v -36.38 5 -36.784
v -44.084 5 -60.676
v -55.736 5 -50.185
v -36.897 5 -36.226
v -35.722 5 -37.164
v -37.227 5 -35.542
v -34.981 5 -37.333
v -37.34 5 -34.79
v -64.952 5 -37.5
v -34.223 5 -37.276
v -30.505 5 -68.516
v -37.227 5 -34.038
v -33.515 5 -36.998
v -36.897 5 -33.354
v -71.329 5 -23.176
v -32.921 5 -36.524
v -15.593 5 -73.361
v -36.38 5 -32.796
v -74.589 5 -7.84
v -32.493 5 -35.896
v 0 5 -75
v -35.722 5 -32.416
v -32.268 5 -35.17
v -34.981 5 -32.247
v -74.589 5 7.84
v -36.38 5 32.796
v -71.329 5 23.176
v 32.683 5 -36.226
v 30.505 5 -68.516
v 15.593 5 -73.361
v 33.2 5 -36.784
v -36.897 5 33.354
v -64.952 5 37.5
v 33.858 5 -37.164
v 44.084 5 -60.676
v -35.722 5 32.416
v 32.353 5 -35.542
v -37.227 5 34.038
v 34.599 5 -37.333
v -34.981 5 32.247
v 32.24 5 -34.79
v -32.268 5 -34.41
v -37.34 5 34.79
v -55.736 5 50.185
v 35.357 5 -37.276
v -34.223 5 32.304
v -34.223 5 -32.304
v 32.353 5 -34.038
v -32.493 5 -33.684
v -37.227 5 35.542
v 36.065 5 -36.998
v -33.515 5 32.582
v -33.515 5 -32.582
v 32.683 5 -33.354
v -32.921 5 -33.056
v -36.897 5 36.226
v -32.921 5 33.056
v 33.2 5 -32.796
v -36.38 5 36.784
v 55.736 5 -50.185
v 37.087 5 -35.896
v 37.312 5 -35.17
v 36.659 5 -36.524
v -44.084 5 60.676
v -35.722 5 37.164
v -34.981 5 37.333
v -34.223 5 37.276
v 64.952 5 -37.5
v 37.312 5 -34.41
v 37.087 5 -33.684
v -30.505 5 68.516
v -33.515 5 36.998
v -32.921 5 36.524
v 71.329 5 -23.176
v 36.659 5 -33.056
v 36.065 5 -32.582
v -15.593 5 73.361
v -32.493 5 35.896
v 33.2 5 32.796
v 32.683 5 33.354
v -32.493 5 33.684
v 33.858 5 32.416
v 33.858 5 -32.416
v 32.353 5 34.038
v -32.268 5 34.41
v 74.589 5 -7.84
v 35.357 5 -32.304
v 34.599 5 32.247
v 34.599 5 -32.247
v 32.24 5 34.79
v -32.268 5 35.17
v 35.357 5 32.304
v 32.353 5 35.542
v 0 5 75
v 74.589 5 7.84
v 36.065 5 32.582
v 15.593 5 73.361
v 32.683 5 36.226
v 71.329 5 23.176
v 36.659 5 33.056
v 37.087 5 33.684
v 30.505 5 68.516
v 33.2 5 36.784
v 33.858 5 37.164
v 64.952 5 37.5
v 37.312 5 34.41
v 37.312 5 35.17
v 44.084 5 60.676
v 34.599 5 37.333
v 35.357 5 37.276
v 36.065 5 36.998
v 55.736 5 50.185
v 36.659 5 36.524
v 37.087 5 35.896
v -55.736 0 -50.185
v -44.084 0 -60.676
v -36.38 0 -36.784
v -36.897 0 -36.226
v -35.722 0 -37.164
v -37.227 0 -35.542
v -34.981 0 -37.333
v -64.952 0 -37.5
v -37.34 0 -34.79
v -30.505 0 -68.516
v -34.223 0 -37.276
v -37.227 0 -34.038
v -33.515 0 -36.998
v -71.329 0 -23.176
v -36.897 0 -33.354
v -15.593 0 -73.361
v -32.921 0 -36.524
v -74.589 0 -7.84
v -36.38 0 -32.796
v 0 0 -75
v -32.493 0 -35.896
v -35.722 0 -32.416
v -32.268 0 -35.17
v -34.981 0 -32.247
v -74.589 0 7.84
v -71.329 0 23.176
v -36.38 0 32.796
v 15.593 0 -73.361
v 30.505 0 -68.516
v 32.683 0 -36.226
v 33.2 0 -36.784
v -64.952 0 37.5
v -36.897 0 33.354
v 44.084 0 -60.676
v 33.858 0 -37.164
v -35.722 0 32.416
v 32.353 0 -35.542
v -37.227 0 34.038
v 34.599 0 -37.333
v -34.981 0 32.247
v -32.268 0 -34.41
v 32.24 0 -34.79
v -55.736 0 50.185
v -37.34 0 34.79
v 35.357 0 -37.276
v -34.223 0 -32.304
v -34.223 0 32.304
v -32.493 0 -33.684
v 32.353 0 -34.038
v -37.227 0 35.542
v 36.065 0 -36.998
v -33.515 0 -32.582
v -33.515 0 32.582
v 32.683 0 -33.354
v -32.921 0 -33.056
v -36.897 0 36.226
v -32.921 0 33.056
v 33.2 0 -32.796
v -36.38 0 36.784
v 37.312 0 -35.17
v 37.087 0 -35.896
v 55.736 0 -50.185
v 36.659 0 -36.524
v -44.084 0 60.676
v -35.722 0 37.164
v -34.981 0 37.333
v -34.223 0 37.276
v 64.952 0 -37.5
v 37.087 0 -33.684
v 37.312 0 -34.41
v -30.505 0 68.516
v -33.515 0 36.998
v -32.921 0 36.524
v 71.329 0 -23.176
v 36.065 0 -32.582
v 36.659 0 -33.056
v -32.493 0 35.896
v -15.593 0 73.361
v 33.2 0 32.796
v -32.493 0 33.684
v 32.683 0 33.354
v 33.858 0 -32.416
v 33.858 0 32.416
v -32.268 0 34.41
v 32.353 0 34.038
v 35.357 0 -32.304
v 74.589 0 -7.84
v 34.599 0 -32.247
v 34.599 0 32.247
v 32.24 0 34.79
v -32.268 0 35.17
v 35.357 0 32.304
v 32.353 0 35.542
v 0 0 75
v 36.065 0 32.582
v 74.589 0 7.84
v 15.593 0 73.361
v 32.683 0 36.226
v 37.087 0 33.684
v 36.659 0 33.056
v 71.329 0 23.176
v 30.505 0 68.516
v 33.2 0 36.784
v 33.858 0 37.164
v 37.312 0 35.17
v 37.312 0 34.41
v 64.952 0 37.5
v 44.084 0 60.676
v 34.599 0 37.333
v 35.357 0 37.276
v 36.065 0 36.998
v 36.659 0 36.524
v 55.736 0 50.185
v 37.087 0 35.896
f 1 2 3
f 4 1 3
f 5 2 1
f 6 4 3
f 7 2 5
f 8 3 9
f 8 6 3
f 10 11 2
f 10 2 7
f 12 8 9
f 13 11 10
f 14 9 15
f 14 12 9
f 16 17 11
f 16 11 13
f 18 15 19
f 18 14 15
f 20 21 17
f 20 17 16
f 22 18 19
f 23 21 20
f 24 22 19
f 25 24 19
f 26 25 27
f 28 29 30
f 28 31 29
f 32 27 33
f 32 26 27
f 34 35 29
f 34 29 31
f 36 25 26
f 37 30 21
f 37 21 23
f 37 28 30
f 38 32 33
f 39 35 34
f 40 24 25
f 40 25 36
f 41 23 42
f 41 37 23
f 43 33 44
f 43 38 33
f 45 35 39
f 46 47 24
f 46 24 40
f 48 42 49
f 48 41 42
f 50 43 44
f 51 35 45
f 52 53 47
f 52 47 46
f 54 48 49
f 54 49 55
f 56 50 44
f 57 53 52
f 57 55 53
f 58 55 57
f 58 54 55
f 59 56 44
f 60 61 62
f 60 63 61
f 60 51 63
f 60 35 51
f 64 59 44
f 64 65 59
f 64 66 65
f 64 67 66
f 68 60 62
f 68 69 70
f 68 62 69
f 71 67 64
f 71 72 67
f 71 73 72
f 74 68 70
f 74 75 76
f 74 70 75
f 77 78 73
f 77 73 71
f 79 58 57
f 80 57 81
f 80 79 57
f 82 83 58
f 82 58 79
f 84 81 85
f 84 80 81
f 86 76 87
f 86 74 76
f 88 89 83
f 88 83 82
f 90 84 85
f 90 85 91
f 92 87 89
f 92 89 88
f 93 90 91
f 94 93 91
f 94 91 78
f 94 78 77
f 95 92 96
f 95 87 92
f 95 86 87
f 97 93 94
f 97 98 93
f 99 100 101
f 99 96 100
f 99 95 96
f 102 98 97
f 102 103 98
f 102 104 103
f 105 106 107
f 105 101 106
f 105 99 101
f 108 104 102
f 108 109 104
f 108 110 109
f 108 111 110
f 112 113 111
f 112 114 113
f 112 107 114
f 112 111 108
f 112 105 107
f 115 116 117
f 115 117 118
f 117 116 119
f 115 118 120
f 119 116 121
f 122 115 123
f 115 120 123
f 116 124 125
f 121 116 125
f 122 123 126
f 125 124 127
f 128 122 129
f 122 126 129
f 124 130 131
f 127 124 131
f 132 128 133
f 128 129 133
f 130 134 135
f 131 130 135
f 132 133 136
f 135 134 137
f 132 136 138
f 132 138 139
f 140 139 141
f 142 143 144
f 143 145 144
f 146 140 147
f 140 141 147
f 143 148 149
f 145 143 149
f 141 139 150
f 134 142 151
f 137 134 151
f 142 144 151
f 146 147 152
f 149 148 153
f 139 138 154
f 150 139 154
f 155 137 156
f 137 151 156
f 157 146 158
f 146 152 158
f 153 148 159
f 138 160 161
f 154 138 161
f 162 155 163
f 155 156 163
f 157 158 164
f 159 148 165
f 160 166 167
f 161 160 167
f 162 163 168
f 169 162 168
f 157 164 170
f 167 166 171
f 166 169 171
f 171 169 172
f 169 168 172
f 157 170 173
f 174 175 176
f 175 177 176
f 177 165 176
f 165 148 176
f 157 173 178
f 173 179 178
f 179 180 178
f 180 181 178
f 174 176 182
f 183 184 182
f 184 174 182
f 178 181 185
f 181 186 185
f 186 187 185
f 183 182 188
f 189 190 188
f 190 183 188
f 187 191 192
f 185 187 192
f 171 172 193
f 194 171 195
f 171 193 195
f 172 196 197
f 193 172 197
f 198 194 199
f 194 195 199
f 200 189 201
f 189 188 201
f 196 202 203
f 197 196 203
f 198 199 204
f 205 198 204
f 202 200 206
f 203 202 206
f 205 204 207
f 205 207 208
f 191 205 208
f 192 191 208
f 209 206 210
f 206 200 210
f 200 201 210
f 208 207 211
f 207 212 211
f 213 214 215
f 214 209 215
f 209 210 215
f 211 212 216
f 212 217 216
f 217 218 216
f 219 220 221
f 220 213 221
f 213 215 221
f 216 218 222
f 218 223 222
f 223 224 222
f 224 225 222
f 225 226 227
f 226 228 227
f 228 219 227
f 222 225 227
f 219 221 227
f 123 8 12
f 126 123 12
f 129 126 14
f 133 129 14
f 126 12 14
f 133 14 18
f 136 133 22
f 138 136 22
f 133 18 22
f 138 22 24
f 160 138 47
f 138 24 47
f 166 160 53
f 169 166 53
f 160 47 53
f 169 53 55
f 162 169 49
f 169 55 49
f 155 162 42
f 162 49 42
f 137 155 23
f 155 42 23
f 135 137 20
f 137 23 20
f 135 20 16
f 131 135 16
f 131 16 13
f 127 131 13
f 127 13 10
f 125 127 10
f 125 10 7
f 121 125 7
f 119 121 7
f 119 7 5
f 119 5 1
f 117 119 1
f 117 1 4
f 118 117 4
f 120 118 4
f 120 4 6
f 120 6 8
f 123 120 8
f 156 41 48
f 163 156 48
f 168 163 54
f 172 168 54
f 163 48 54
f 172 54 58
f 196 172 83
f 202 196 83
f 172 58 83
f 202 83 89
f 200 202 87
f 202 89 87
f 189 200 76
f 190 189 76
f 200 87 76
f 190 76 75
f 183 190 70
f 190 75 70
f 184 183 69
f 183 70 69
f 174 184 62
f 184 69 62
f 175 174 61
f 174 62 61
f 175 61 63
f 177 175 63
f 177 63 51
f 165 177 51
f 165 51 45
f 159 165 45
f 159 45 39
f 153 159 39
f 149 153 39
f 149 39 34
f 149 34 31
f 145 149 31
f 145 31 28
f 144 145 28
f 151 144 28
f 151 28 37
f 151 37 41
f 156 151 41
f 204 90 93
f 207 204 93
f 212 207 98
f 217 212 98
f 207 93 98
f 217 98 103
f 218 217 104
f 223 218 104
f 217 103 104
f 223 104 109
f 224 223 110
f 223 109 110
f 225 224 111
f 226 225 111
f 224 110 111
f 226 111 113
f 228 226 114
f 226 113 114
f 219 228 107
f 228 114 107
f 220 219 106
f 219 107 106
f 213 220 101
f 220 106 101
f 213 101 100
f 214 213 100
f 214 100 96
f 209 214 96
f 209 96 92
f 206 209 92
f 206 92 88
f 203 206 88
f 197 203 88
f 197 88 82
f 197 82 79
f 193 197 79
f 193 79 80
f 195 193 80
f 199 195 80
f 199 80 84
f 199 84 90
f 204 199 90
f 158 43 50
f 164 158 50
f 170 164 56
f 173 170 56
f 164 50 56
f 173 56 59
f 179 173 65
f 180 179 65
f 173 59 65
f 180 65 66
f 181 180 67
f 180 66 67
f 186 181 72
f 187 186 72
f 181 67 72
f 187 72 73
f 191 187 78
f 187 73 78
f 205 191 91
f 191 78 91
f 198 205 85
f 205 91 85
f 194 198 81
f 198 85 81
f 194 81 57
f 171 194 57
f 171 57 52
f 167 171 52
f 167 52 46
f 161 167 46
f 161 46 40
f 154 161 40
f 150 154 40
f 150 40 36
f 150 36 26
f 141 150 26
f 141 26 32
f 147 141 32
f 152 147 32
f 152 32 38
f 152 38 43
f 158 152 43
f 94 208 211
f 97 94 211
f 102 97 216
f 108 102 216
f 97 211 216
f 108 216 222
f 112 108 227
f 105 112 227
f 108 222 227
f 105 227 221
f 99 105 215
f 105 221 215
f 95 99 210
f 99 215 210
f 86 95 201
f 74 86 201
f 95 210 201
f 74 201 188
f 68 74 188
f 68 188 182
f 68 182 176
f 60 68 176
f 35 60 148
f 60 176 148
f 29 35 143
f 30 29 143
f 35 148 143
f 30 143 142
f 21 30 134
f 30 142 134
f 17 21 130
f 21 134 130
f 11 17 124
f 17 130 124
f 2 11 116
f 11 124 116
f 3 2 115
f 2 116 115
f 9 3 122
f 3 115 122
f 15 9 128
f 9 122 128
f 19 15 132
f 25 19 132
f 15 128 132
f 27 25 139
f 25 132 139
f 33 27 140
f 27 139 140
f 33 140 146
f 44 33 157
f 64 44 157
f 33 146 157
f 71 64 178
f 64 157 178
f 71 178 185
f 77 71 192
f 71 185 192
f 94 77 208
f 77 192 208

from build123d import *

# Parameters (mm, degrees)
SKETCH_1_R      = 75
EXTRUDE_1_DEPTH = 5
HOLE_WIZARD_2_D = 5.1


with BuildPart() as part:
    # 草图1 → 凸台-拉伸1 (new body)
    with BuildSketch(Plane(origin=(0, 0, 0), x_dir=(1, 0, 0), z_dir=(0, 1, 0))):
        with Locations(Location((0, 0, 0), (0, 0, 270))):
            Circle(SKETCH_1_R)
    extrude(amount=EXTRUDE_1_DEPTH)

    # 孔2 (through all)
    with Locations(Plane.XZ):
        with Locations((34.79, -34.79), (34.79, 34.79), (-34.79, -34.79), (-34.79, 34.79)):
            Hole(HOLE_WIZARD_2_D / 2)


solid = part.part
